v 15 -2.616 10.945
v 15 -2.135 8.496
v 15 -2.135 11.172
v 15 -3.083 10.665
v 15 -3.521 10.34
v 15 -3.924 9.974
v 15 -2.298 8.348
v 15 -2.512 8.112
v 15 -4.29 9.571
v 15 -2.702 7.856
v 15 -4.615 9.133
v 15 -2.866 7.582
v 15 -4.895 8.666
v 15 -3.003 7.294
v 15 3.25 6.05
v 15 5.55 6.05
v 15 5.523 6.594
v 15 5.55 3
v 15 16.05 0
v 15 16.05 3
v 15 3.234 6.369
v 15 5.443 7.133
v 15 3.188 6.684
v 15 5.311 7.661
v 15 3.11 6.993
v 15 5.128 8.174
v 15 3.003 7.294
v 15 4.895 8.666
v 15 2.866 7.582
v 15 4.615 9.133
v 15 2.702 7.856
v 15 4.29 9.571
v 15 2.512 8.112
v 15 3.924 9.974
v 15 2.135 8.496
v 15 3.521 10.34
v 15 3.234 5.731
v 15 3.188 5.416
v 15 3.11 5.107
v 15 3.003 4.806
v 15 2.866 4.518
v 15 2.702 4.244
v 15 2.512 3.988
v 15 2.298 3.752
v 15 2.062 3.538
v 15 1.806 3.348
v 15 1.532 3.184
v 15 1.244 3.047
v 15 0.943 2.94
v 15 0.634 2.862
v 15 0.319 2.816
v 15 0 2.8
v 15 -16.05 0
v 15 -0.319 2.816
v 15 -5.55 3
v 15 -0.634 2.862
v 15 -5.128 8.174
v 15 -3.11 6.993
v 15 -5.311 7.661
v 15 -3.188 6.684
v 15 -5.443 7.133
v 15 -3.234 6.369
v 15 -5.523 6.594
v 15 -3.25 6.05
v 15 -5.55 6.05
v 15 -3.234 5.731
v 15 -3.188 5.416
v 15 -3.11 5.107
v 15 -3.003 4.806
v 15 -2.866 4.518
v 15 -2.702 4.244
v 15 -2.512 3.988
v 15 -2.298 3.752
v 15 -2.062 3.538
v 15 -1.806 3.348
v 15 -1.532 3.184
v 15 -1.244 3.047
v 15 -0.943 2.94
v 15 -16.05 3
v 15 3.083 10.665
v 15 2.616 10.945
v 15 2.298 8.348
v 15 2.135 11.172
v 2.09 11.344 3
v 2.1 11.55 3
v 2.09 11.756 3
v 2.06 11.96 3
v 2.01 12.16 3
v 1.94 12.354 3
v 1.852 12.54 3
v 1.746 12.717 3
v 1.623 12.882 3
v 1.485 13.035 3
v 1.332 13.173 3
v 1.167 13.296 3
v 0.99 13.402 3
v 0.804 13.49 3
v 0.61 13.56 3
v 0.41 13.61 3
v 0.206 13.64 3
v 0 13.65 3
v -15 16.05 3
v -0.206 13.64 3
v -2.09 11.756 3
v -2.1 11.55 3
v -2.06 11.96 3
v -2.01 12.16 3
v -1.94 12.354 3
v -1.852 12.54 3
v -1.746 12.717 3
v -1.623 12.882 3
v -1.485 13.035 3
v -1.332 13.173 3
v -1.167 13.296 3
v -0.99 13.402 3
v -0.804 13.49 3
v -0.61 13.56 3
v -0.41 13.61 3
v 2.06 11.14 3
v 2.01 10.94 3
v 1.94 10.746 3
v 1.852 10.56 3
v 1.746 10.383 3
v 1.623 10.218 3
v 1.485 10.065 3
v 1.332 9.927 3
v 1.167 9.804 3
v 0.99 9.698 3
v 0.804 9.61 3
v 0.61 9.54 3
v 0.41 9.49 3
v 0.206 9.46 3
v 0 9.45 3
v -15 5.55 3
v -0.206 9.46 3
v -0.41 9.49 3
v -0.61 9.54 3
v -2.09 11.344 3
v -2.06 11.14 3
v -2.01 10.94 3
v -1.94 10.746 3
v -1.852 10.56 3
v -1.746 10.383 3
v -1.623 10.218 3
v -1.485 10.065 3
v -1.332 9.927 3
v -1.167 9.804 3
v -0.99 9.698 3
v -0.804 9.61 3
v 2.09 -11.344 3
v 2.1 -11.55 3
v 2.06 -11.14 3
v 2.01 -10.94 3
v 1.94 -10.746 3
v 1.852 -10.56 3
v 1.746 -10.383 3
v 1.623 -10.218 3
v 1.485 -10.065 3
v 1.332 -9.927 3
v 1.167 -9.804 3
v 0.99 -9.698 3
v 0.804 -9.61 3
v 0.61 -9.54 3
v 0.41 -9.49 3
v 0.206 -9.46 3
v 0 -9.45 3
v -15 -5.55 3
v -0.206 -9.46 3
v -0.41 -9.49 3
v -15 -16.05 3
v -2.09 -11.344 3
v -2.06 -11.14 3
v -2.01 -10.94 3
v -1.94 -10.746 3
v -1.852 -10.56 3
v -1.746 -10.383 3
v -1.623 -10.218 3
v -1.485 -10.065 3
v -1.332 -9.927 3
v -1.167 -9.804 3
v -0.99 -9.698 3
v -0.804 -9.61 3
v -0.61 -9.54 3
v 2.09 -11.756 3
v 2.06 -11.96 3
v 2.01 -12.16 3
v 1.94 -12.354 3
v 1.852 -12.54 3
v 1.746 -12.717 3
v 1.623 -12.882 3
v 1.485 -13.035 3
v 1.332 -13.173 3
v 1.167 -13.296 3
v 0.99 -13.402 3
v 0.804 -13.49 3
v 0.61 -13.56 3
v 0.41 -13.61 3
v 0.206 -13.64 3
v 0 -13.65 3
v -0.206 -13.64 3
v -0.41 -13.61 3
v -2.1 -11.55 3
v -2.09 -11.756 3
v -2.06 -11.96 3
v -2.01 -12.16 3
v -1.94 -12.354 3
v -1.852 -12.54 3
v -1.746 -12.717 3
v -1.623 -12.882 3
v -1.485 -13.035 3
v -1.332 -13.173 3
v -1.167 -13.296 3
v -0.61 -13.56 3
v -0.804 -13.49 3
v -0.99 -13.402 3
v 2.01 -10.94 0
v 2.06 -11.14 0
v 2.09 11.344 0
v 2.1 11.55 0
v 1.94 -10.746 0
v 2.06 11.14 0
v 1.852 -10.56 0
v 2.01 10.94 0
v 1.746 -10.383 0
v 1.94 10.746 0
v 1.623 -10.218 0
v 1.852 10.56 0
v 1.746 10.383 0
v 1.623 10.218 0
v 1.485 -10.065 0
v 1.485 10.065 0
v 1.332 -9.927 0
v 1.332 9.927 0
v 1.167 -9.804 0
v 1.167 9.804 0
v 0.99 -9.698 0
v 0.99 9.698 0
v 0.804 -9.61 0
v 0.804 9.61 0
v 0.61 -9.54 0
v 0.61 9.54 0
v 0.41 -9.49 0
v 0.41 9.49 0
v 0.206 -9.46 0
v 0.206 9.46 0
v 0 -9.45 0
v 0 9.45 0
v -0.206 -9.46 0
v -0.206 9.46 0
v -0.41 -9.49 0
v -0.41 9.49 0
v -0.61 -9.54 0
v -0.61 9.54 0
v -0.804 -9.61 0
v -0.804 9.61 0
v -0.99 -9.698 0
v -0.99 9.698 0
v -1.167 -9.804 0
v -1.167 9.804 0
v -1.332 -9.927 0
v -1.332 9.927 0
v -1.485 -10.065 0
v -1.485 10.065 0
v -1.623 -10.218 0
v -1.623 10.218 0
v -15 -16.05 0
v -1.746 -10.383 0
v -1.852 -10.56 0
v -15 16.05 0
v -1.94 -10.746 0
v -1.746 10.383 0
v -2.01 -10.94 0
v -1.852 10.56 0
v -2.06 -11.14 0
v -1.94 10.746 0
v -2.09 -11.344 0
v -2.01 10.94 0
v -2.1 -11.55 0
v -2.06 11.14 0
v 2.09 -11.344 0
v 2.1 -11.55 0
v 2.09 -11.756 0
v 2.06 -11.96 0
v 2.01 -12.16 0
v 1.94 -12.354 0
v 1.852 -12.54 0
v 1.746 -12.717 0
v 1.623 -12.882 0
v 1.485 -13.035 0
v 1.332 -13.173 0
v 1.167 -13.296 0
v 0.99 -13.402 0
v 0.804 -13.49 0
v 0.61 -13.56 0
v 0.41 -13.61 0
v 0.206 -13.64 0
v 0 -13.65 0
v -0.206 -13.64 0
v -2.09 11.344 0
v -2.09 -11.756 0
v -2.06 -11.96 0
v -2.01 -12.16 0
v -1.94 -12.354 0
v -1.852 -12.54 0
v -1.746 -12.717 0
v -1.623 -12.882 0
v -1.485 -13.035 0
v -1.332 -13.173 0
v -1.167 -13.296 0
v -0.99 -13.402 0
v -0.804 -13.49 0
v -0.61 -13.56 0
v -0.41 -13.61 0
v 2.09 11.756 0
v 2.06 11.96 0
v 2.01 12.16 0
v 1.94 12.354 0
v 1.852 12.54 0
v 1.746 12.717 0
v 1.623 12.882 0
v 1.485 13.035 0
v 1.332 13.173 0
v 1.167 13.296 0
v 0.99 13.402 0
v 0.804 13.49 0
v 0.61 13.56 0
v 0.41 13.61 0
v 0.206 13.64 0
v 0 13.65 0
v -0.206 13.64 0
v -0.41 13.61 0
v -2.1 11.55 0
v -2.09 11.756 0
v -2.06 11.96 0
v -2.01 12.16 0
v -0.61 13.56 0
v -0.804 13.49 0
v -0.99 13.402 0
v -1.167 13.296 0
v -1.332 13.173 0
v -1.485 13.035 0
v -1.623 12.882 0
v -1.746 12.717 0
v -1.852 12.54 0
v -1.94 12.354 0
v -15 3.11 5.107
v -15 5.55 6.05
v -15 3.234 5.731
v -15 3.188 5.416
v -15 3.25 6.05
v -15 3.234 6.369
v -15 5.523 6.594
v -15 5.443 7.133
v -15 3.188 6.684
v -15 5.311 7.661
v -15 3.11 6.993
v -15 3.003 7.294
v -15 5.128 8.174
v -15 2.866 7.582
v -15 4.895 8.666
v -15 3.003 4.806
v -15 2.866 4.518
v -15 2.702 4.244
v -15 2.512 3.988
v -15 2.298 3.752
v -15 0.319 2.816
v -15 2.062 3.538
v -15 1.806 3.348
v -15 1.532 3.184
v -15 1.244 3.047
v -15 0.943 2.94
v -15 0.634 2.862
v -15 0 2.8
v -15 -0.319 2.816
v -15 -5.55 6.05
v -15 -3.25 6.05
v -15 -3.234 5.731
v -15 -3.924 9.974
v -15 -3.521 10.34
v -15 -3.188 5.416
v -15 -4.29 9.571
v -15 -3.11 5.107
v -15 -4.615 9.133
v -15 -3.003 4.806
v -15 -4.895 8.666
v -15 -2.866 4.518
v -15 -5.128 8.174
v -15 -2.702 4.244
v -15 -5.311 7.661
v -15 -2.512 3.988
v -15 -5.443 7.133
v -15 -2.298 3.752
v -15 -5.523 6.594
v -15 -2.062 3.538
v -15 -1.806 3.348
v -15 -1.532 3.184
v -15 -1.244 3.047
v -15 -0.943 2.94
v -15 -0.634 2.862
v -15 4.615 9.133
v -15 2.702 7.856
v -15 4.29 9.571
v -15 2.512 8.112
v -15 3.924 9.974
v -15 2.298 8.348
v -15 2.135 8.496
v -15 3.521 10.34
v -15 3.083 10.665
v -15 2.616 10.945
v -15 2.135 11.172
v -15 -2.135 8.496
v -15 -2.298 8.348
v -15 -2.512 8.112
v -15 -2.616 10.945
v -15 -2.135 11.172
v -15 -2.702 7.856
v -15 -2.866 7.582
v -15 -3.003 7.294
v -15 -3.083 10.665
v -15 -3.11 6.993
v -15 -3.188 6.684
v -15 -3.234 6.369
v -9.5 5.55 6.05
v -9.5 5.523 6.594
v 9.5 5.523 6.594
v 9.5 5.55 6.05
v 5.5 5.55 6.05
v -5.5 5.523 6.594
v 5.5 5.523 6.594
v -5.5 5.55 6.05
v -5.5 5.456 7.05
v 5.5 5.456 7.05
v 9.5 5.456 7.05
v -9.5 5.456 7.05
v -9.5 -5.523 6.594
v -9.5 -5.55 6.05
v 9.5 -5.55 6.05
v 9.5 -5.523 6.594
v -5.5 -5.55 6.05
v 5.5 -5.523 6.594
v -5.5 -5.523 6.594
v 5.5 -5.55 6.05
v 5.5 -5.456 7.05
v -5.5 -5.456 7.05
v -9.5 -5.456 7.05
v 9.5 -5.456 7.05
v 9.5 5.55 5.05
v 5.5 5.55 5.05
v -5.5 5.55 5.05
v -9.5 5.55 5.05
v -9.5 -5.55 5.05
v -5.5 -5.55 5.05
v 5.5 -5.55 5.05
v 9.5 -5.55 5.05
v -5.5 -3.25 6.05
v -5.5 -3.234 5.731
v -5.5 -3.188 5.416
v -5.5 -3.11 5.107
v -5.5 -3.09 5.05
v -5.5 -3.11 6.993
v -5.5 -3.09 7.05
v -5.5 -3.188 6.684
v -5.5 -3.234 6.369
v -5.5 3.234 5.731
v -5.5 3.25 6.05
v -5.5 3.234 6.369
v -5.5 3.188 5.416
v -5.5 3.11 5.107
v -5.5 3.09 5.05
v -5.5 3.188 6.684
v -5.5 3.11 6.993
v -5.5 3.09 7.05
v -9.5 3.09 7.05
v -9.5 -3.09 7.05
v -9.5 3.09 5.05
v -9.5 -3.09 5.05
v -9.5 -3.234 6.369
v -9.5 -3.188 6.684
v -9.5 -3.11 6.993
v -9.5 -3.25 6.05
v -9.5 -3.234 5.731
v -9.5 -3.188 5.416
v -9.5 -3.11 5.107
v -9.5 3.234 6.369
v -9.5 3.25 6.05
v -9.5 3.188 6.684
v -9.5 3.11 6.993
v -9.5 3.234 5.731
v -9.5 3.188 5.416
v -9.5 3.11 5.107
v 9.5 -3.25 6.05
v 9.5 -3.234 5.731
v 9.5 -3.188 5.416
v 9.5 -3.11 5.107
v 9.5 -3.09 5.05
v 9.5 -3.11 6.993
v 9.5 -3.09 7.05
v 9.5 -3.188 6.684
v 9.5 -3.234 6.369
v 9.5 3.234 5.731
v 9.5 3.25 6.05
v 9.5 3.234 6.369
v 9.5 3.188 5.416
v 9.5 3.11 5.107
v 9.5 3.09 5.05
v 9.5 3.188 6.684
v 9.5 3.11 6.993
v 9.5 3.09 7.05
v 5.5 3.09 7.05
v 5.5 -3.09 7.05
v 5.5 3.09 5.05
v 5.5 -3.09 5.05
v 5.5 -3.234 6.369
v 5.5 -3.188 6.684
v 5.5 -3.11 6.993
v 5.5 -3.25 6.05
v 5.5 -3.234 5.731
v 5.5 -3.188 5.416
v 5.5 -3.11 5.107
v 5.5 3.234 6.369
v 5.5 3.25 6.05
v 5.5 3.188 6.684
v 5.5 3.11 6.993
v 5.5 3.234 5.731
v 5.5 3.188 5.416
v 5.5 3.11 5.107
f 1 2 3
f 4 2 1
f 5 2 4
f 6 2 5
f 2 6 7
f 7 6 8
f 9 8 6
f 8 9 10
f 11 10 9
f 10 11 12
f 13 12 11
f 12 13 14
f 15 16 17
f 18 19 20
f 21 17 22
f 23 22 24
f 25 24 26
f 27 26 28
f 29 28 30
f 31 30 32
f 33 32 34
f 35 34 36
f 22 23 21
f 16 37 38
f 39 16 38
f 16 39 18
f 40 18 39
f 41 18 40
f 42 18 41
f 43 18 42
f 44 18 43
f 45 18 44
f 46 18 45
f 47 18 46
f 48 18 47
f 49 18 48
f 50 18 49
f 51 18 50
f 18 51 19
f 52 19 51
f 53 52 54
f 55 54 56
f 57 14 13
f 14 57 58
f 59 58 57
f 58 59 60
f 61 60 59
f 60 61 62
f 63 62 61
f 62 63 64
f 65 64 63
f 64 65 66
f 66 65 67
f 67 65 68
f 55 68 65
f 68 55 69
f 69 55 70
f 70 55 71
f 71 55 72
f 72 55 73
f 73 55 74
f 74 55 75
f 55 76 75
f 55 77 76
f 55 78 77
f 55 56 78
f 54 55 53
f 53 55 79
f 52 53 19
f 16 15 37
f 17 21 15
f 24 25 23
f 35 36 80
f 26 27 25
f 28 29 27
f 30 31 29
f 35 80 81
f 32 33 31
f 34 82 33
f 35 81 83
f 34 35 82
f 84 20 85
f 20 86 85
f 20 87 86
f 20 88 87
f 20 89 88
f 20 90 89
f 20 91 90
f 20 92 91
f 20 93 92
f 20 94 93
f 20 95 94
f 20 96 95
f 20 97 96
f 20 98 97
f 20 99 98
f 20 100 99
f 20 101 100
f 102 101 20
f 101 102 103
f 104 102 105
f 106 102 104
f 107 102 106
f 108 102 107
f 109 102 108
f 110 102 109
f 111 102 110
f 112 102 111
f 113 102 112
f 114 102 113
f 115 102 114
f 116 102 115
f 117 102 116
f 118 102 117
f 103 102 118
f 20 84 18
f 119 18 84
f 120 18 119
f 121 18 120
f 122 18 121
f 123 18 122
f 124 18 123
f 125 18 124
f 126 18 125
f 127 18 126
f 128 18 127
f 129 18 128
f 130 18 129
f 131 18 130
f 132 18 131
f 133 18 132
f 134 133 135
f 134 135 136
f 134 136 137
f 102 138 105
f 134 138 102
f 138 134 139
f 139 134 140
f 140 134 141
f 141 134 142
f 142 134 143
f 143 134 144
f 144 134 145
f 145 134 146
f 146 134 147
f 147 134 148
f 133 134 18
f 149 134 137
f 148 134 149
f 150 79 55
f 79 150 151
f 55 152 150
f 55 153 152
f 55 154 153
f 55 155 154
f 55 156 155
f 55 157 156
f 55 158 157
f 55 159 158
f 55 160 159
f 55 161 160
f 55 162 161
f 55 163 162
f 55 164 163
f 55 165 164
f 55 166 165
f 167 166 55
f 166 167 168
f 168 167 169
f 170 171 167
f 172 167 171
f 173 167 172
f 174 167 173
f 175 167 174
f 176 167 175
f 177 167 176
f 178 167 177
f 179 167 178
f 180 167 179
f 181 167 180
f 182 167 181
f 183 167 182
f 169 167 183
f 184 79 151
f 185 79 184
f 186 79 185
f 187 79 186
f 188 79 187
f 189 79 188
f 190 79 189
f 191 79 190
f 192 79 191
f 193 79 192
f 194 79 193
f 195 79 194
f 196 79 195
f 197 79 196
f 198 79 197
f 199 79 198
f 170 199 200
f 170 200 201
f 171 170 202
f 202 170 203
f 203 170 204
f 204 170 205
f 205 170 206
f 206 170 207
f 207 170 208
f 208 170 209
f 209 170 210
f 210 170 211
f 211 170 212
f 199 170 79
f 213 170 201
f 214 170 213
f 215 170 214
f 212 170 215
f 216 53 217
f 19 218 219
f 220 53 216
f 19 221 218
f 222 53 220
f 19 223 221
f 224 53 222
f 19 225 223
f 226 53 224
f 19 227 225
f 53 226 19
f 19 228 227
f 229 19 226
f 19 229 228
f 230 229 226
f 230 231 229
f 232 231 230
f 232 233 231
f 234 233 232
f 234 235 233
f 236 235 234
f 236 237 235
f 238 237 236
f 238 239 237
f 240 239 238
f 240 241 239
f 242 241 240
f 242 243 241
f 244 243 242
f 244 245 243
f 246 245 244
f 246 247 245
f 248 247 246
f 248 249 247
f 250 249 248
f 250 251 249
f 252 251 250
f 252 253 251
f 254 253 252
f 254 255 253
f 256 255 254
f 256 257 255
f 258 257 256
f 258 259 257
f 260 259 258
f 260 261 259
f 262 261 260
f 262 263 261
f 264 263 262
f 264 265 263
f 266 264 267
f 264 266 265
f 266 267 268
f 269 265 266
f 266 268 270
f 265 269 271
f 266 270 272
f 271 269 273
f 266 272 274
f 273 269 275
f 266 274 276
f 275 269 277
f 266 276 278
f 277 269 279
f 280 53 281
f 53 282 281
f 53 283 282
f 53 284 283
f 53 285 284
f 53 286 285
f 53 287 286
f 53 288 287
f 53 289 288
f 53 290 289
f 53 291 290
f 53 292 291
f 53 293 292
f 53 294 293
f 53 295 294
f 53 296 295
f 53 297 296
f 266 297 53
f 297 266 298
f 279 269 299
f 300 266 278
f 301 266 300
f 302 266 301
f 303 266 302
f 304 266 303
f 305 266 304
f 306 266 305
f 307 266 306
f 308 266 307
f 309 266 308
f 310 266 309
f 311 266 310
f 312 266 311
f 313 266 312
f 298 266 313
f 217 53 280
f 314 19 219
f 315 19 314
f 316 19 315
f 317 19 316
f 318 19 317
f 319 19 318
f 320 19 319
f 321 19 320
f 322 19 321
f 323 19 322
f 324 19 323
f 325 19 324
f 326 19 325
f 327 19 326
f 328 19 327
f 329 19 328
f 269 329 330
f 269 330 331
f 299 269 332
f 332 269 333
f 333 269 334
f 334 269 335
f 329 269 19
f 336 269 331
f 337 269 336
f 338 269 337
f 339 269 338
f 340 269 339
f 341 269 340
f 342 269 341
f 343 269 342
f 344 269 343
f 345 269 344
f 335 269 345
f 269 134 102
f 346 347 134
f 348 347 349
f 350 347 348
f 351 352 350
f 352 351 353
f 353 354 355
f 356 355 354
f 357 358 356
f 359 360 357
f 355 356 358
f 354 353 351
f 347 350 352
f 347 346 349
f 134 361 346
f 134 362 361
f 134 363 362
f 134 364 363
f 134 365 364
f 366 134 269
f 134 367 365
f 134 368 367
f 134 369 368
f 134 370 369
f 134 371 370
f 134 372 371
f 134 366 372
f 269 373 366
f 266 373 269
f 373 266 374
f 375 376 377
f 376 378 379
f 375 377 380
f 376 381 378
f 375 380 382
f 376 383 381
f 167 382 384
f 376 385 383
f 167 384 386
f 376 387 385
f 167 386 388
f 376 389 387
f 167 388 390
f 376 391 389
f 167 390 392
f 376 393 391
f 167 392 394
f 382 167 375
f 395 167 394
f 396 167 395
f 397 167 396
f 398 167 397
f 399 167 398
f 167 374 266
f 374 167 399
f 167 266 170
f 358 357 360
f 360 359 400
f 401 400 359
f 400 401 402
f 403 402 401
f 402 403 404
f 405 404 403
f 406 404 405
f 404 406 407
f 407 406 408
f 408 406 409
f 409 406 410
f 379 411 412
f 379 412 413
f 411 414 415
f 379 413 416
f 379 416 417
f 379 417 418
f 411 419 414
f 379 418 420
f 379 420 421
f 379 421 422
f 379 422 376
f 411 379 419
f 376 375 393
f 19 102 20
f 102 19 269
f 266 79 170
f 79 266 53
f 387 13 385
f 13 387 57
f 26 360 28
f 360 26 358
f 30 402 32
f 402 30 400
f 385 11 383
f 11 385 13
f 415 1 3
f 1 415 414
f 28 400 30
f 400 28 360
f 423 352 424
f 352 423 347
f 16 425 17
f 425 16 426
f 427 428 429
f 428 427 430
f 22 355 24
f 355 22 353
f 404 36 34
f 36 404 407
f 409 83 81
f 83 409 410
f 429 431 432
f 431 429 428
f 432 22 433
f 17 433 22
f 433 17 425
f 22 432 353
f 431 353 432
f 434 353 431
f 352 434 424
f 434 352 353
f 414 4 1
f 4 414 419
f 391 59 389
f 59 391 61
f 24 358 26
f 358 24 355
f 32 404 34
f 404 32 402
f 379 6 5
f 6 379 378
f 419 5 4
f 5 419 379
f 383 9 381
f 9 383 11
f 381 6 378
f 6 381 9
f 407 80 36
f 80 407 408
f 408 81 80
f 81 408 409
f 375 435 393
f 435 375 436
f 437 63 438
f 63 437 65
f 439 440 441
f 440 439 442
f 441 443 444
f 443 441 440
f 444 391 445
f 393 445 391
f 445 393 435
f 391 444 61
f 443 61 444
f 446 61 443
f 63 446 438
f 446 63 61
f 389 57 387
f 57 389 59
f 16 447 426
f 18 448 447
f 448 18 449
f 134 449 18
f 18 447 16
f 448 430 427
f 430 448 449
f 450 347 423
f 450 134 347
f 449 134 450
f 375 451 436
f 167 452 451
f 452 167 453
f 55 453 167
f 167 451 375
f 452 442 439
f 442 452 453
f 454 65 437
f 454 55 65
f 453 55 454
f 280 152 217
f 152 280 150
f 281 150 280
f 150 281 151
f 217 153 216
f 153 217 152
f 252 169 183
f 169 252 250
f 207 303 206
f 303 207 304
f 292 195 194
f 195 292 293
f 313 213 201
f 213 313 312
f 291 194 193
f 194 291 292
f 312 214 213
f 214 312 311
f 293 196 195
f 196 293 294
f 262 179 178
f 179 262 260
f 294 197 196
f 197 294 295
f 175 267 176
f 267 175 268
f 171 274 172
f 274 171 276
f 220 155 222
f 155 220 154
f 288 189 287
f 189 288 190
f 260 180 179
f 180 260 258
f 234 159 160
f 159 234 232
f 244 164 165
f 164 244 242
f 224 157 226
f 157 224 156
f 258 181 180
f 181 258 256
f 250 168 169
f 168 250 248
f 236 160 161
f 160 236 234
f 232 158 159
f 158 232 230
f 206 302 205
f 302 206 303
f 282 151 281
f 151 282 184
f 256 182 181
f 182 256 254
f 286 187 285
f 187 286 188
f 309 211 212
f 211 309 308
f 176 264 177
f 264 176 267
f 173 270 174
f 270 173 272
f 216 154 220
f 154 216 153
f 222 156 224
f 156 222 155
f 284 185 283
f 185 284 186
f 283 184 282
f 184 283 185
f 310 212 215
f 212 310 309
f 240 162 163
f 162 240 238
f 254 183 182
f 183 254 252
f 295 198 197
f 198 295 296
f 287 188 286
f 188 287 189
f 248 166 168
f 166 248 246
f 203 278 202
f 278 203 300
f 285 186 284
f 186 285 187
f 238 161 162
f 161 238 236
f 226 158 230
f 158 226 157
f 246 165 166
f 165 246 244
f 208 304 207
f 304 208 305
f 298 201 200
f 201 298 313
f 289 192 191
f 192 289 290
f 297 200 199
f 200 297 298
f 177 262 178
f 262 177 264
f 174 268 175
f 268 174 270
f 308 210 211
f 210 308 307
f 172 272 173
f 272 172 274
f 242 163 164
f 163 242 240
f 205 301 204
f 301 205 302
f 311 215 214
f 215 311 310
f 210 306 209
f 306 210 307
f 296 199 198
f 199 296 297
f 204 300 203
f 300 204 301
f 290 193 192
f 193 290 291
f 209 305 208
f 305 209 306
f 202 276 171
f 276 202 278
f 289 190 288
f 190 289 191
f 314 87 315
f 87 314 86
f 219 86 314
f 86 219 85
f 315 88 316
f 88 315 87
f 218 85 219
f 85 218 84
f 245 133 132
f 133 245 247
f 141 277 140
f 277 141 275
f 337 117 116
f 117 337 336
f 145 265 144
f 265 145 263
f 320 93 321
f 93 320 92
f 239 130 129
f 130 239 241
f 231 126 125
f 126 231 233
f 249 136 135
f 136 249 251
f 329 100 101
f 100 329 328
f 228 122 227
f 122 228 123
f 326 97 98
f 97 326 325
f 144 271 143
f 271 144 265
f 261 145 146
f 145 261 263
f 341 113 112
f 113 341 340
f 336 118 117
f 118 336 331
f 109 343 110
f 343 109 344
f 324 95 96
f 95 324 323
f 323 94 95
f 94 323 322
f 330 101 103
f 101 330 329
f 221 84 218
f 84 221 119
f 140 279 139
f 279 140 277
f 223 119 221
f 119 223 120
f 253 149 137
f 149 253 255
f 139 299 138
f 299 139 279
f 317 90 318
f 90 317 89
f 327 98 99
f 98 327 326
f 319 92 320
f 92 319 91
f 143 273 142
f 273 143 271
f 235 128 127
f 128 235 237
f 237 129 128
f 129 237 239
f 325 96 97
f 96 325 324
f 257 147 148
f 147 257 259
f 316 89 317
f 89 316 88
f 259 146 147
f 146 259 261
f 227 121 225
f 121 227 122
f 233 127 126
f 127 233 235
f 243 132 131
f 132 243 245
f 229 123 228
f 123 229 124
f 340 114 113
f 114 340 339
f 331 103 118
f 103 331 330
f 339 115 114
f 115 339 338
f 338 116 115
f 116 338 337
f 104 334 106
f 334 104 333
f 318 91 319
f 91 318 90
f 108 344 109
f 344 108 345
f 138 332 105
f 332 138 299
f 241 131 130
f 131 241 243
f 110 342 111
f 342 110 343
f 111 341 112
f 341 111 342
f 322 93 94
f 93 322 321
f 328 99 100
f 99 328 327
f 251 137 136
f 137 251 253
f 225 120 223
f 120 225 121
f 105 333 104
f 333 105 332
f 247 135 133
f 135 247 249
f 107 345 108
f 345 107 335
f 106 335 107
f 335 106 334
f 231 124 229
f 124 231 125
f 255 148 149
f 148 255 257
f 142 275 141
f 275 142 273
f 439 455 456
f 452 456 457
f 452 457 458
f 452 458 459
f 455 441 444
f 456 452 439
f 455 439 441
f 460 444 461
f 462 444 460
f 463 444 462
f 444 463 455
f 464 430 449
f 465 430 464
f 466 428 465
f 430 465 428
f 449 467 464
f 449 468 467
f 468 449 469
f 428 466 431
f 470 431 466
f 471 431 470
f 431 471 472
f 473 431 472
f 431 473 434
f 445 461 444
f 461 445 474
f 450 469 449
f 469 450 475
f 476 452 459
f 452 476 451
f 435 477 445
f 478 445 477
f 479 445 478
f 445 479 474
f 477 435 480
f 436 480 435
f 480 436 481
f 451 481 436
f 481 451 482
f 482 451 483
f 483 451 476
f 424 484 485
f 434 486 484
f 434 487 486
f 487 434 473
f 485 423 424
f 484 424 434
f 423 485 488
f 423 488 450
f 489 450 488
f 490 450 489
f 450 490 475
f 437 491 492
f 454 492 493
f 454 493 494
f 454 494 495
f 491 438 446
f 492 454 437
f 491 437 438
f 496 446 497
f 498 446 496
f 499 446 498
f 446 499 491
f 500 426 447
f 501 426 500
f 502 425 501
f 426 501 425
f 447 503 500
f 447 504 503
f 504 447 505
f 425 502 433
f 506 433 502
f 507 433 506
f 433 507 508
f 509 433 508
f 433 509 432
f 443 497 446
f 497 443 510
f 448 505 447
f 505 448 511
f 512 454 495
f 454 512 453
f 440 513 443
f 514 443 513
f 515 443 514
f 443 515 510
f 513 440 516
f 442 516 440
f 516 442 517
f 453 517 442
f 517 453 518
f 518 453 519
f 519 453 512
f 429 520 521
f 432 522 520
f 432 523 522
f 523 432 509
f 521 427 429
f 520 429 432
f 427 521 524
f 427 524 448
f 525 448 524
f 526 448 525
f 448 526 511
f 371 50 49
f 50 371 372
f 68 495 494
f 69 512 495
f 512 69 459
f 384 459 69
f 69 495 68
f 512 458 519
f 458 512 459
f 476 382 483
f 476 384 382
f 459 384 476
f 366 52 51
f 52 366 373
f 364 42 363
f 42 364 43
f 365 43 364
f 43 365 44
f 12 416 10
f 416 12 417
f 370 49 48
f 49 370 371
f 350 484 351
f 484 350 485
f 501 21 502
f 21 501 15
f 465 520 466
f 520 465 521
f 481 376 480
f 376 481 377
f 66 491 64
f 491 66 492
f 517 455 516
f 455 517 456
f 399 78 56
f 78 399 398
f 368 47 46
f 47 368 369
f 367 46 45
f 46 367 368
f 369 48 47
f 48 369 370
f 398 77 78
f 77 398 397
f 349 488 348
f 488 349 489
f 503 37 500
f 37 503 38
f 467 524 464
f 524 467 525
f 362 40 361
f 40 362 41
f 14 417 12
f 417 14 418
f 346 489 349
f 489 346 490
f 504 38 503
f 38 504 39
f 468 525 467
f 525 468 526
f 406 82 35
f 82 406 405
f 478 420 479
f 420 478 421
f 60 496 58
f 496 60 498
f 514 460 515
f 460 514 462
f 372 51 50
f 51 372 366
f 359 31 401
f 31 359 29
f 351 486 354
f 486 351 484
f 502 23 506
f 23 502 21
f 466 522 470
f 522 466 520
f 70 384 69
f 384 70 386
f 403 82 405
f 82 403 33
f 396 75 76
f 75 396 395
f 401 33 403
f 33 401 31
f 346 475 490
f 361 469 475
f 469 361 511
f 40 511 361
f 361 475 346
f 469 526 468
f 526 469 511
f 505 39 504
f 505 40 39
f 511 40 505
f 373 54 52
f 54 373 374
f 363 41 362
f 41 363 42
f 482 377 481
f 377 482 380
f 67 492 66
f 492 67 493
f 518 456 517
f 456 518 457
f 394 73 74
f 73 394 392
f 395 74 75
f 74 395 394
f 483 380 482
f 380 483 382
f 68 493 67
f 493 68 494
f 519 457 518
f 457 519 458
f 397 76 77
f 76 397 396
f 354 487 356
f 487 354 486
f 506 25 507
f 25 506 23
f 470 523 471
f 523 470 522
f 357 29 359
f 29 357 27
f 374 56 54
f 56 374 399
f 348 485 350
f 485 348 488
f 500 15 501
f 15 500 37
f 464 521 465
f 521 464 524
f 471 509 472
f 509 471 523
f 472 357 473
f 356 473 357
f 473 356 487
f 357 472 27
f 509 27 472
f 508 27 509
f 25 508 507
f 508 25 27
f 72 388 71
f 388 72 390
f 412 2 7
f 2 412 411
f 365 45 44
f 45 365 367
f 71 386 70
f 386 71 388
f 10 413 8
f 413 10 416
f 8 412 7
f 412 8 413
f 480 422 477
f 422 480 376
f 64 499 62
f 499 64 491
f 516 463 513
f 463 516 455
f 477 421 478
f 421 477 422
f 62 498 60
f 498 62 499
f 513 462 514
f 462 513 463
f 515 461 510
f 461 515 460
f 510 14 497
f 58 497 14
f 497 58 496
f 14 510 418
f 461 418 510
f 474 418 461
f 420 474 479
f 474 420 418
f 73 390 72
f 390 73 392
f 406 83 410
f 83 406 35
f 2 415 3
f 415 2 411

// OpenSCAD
// Coax strain relief clip: screw-down saddle with zip-tie slots. CC0.
// coax: RG-58 ~5, RG-8X ~6.1, LMR-400/RG-213 ~10.3 mm.
coax = 6.1; len = 30; screw = 4.2;
$fn = 64;
w = coax + 8; base = 3;
difference() {
  union() {
    translate([-len / 2, -w / 2 - 9, 0]) cube([len, w + 18, base]);
    translate([-len / 2, 0, base + coax / 2]) rotate([0, 90, 0]) cylinder(d = coax + 5, h = len);
    translate([-len / 2, -(coax + 5) / 2, 0]) cube([len, coax + 5, base + coax / 2]);
  }
  translate([-len / 2 - 1, 0, base + coax / 2]) rotate([0, 90, 0]) cylinder(d = coax + 0.4, h = len + 2);
  translate([-len / 2 - 1, -coax * 0.35, base + coax / 2]) cube([len + 2, coax * 0.7, coax]);
  for (y = [-w / 2 - 4.5, w / 2 + 4.5]) translate([0, y, -1]) cylinder(d = screw, h = base + 2);
  for (x = [-len / 4, len / 4]) translate([x - 2, -w, base + coax / 2 - 1]) cube([4, 2 * w, 2]);
}
